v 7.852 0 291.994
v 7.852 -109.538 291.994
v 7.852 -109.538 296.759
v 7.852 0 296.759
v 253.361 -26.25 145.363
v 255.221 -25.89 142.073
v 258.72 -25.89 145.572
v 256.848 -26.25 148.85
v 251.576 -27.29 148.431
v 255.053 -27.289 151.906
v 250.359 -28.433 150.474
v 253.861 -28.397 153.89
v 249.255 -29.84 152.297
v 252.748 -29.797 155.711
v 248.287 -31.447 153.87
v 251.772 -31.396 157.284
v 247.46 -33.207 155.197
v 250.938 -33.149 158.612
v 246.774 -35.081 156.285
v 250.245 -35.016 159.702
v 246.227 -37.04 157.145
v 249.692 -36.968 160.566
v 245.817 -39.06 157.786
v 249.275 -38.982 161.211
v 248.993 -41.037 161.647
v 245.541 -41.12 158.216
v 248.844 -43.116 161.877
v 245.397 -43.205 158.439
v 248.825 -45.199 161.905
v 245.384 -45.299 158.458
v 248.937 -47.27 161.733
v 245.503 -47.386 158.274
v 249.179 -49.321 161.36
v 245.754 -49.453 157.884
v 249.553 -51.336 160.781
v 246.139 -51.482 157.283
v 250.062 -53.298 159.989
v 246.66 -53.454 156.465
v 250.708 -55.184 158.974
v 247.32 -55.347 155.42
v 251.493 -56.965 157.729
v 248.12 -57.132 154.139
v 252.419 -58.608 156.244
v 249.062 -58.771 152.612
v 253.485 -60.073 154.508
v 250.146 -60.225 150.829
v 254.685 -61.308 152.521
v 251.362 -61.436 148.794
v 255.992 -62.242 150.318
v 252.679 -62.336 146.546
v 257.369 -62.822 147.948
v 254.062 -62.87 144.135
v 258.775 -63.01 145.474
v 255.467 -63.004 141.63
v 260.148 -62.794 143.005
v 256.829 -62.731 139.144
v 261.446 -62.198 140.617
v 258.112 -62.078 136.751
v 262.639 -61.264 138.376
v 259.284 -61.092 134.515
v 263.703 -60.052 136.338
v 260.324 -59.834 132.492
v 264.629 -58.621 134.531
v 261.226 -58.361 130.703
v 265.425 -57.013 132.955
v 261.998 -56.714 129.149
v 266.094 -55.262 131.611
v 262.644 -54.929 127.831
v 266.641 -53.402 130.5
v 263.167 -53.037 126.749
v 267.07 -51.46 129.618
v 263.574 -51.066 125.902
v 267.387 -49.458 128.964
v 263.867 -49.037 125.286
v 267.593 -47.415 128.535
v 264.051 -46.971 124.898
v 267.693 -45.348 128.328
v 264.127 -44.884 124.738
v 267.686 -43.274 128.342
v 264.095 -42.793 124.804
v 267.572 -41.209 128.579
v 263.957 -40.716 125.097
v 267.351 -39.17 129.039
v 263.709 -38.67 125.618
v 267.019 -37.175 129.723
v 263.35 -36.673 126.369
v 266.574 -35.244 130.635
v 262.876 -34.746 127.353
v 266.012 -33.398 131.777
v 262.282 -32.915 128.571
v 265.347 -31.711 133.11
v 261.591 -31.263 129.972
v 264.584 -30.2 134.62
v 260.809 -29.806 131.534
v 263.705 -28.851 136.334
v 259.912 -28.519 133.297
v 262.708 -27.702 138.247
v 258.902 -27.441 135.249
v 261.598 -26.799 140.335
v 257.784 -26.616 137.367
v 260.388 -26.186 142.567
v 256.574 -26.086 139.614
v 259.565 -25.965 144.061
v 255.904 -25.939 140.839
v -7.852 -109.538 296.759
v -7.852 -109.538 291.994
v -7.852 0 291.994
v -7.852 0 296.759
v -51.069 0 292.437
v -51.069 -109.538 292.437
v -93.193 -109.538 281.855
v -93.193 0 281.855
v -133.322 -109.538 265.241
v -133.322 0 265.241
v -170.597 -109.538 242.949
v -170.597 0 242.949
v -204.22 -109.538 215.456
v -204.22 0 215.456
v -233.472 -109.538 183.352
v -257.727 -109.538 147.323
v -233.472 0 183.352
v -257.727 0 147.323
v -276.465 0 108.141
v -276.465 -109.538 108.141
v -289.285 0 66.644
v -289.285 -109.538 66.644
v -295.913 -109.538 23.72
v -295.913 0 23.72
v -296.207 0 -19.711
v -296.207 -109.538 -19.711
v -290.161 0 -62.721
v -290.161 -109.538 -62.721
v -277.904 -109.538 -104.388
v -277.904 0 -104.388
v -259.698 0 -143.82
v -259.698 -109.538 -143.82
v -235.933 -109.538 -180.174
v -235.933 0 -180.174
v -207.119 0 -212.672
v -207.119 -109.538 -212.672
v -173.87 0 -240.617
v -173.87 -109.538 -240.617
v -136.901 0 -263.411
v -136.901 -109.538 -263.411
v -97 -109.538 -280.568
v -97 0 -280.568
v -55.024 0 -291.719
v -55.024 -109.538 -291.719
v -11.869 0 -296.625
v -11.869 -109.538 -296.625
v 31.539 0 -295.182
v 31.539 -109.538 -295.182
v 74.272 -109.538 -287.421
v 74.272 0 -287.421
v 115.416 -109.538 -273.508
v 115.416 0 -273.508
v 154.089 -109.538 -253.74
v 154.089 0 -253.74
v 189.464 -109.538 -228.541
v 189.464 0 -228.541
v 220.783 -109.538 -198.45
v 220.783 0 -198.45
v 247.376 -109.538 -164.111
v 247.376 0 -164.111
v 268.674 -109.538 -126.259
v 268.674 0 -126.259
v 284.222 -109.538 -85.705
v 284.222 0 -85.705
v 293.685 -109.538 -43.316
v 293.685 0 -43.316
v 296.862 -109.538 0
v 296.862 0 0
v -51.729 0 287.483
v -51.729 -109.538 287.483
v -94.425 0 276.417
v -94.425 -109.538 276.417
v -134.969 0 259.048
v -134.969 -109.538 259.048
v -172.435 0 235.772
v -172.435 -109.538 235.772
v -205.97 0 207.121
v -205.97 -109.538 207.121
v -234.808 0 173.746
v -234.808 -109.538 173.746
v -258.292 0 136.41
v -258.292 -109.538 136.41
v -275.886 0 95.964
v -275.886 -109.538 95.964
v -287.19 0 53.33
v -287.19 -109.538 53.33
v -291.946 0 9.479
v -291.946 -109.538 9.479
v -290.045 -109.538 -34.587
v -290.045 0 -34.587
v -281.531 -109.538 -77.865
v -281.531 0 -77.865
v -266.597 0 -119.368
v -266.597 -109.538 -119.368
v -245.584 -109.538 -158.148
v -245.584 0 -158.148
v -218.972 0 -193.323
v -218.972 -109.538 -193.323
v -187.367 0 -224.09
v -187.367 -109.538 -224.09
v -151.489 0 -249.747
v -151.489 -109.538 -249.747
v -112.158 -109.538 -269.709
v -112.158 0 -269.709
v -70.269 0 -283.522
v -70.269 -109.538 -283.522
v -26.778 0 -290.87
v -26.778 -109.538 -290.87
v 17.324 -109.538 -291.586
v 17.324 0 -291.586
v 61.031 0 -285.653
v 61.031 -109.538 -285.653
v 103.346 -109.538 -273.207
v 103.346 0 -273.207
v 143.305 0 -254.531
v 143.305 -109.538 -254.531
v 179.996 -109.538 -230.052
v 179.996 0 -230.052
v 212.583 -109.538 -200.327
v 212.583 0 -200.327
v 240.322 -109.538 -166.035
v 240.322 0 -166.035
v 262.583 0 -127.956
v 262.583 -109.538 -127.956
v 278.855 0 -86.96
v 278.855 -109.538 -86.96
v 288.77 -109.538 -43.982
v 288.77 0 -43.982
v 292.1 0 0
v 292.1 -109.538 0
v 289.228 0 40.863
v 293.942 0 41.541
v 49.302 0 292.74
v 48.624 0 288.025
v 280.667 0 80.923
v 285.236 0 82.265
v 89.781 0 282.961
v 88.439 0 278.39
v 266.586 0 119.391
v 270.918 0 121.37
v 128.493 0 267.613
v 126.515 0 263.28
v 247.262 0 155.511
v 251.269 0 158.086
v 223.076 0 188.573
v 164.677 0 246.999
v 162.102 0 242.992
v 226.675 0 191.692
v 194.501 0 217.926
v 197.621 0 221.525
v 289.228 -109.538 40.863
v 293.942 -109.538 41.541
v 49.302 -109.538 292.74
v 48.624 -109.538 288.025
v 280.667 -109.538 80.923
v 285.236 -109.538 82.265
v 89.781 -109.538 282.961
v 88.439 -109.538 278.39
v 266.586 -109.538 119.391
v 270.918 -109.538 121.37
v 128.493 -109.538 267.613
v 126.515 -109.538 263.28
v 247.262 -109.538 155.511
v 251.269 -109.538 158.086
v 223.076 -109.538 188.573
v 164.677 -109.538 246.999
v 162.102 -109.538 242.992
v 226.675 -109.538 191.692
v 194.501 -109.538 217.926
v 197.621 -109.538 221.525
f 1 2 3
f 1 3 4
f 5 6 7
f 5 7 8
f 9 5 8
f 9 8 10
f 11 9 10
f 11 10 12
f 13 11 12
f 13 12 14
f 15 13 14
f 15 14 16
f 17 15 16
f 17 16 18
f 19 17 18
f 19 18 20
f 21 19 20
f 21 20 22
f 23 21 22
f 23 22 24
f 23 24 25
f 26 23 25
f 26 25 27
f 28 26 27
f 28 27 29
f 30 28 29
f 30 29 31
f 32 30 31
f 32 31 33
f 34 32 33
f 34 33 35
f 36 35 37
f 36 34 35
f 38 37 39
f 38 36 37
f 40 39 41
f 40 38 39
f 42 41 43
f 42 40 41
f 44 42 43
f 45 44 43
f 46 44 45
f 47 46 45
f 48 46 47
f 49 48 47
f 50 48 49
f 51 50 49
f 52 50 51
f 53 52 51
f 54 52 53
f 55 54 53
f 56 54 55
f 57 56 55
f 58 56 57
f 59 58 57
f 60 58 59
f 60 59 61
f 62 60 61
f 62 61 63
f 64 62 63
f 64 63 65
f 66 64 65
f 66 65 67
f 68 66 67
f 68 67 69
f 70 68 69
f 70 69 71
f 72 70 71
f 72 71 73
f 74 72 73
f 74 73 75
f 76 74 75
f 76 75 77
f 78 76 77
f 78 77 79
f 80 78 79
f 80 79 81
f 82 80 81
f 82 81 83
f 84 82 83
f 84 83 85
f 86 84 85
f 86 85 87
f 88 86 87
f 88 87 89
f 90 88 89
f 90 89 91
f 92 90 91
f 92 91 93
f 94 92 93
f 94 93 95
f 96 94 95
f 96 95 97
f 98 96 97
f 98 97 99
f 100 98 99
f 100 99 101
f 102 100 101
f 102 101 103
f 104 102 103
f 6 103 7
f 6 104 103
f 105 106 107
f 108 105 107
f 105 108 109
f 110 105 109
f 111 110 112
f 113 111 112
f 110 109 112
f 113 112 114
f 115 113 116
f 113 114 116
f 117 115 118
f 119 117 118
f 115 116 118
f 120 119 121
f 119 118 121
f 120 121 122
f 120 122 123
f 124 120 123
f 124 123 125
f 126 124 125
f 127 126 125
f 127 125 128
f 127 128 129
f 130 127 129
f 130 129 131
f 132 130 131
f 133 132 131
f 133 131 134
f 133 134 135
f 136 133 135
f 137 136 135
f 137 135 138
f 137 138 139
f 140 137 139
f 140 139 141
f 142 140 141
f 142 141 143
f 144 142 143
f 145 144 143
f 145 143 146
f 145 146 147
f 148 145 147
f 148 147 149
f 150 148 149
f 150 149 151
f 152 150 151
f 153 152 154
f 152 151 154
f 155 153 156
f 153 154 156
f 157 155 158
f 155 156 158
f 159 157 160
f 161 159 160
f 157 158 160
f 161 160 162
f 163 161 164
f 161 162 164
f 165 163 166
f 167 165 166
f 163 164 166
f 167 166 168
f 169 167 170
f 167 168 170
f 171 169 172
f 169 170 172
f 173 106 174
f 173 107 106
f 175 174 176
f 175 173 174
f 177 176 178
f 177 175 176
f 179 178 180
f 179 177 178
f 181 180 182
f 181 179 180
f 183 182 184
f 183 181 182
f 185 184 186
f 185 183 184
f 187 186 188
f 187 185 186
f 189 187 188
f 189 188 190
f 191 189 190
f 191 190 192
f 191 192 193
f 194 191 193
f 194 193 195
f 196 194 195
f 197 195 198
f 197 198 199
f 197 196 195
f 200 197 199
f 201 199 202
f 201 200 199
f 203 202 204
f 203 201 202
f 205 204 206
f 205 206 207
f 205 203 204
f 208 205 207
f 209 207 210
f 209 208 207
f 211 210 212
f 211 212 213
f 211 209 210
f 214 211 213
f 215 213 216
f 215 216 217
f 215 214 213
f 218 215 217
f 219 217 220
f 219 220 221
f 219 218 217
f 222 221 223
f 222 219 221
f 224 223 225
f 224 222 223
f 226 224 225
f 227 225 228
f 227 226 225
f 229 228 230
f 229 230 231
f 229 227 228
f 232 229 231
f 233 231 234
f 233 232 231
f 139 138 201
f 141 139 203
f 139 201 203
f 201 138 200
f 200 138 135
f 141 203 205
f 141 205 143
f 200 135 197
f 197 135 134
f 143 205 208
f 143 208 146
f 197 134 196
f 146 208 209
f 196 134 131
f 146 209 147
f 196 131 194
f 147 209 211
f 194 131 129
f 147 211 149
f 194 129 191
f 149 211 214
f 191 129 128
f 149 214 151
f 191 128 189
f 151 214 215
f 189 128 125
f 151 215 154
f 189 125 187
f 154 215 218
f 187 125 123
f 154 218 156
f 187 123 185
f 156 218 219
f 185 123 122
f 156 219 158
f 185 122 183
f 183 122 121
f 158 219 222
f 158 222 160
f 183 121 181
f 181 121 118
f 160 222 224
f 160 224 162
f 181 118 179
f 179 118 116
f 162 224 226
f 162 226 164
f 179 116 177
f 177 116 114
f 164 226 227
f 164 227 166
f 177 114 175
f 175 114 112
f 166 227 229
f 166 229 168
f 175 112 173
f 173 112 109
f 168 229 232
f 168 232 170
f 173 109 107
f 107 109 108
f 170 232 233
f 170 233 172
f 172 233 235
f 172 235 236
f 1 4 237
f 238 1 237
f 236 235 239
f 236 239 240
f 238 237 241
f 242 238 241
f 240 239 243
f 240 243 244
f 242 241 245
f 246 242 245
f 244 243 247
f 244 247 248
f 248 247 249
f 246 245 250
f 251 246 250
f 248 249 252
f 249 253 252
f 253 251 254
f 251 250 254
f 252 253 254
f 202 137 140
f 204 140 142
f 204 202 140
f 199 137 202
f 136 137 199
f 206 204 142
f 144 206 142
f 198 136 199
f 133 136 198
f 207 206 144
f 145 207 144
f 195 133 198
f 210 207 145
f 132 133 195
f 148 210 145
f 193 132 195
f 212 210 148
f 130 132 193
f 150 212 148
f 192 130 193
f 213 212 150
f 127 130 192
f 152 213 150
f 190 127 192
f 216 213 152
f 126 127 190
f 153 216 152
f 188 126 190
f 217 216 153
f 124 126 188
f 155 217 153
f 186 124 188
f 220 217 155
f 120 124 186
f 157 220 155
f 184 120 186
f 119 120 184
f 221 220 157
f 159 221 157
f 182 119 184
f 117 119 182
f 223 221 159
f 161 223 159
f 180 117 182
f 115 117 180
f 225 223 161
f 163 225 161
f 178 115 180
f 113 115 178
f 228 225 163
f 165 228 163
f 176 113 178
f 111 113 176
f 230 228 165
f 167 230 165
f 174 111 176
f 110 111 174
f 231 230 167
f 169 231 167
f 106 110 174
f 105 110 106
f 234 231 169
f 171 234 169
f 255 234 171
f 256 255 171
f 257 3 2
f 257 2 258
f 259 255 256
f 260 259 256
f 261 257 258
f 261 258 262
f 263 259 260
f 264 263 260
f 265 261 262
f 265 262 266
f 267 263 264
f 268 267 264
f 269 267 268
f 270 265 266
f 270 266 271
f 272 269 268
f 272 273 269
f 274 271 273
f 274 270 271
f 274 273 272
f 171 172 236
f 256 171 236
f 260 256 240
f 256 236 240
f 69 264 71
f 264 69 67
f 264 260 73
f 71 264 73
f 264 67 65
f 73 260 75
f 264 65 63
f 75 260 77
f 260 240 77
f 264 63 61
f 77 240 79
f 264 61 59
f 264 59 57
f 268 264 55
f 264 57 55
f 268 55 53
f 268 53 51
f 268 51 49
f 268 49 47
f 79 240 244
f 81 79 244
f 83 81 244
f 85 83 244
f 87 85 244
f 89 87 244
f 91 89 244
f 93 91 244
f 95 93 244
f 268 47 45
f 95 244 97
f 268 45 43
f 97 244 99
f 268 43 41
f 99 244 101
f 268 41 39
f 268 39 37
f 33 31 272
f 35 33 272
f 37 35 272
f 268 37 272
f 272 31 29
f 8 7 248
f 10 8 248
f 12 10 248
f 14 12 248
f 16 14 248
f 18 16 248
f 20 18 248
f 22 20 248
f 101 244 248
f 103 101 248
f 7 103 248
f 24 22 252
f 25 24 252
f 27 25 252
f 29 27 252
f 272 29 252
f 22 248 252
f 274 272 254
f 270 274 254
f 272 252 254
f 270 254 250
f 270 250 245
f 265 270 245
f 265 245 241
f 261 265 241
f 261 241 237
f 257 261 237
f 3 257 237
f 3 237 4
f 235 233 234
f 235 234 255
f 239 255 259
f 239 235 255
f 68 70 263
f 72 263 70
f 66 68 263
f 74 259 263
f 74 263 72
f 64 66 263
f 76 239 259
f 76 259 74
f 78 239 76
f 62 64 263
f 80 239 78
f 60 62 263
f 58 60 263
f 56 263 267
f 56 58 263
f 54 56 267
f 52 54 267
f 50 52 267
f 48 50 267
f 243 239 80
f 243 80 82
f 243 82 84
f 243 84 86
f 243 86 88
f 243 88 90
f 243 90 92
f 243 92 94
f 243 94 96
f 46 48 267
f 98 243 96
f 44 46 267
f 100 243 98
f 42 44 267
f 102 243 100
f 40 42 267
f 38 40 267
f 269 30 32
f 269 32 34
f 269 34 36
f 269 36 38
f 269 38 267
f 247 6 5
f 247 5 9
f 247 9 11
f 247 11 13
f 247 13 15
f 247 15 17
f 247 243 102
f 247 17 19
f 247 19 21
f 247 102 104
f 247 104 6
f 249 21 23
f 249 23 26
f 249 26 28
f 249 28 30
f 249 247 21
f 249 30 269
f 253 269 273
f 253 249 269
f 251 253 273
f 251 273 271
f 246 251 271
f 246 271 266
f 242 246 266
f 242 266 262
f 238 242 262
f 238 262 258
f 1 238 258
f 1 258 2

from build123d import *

# Parameters (mm, degrees)
F0_R     = 296.8625
F0_R_2   = 292.1
F1_DEPTH = 109.5375
F2_W     = 15.704696998
F2_H     = 243.4227466583
F3_DEPTH = 304.8
F5_R     = 18.5604428804
F6_DEPTH = 304.8


with BuildPart() as f1:
    # F0 (on Front) → F1 (new body)
    with BuildSketch(Plane.XZ):
        Circle(F0_R)
        Circle(F0_R_2, mode=Mode.SUBTRACT)
    extrude(amount=F1_DEPTH)

    # F2 (on Top) → F3 (cut)
    with BuildSketch(Plane.XY):
        Rectangle(F2_W, F2_H)
    extrude(amount=F3_DEPTH, mode=Mode.SUBTRACT)

    # F5 (on face) → F6 (cut)
    with BuildSketch(Plane(origin=(0, 0, 0), x_dir=(0, 1, 0), z_dir=(0.7071067812, 0, 0.7071067812))):
        with Locations((-44.45, -80.0073221326)):
            Circle(F5_R)
    extrude(amount=F6_DEPTH, mode=Mode.SUBTRACT)


solid = f1.part
